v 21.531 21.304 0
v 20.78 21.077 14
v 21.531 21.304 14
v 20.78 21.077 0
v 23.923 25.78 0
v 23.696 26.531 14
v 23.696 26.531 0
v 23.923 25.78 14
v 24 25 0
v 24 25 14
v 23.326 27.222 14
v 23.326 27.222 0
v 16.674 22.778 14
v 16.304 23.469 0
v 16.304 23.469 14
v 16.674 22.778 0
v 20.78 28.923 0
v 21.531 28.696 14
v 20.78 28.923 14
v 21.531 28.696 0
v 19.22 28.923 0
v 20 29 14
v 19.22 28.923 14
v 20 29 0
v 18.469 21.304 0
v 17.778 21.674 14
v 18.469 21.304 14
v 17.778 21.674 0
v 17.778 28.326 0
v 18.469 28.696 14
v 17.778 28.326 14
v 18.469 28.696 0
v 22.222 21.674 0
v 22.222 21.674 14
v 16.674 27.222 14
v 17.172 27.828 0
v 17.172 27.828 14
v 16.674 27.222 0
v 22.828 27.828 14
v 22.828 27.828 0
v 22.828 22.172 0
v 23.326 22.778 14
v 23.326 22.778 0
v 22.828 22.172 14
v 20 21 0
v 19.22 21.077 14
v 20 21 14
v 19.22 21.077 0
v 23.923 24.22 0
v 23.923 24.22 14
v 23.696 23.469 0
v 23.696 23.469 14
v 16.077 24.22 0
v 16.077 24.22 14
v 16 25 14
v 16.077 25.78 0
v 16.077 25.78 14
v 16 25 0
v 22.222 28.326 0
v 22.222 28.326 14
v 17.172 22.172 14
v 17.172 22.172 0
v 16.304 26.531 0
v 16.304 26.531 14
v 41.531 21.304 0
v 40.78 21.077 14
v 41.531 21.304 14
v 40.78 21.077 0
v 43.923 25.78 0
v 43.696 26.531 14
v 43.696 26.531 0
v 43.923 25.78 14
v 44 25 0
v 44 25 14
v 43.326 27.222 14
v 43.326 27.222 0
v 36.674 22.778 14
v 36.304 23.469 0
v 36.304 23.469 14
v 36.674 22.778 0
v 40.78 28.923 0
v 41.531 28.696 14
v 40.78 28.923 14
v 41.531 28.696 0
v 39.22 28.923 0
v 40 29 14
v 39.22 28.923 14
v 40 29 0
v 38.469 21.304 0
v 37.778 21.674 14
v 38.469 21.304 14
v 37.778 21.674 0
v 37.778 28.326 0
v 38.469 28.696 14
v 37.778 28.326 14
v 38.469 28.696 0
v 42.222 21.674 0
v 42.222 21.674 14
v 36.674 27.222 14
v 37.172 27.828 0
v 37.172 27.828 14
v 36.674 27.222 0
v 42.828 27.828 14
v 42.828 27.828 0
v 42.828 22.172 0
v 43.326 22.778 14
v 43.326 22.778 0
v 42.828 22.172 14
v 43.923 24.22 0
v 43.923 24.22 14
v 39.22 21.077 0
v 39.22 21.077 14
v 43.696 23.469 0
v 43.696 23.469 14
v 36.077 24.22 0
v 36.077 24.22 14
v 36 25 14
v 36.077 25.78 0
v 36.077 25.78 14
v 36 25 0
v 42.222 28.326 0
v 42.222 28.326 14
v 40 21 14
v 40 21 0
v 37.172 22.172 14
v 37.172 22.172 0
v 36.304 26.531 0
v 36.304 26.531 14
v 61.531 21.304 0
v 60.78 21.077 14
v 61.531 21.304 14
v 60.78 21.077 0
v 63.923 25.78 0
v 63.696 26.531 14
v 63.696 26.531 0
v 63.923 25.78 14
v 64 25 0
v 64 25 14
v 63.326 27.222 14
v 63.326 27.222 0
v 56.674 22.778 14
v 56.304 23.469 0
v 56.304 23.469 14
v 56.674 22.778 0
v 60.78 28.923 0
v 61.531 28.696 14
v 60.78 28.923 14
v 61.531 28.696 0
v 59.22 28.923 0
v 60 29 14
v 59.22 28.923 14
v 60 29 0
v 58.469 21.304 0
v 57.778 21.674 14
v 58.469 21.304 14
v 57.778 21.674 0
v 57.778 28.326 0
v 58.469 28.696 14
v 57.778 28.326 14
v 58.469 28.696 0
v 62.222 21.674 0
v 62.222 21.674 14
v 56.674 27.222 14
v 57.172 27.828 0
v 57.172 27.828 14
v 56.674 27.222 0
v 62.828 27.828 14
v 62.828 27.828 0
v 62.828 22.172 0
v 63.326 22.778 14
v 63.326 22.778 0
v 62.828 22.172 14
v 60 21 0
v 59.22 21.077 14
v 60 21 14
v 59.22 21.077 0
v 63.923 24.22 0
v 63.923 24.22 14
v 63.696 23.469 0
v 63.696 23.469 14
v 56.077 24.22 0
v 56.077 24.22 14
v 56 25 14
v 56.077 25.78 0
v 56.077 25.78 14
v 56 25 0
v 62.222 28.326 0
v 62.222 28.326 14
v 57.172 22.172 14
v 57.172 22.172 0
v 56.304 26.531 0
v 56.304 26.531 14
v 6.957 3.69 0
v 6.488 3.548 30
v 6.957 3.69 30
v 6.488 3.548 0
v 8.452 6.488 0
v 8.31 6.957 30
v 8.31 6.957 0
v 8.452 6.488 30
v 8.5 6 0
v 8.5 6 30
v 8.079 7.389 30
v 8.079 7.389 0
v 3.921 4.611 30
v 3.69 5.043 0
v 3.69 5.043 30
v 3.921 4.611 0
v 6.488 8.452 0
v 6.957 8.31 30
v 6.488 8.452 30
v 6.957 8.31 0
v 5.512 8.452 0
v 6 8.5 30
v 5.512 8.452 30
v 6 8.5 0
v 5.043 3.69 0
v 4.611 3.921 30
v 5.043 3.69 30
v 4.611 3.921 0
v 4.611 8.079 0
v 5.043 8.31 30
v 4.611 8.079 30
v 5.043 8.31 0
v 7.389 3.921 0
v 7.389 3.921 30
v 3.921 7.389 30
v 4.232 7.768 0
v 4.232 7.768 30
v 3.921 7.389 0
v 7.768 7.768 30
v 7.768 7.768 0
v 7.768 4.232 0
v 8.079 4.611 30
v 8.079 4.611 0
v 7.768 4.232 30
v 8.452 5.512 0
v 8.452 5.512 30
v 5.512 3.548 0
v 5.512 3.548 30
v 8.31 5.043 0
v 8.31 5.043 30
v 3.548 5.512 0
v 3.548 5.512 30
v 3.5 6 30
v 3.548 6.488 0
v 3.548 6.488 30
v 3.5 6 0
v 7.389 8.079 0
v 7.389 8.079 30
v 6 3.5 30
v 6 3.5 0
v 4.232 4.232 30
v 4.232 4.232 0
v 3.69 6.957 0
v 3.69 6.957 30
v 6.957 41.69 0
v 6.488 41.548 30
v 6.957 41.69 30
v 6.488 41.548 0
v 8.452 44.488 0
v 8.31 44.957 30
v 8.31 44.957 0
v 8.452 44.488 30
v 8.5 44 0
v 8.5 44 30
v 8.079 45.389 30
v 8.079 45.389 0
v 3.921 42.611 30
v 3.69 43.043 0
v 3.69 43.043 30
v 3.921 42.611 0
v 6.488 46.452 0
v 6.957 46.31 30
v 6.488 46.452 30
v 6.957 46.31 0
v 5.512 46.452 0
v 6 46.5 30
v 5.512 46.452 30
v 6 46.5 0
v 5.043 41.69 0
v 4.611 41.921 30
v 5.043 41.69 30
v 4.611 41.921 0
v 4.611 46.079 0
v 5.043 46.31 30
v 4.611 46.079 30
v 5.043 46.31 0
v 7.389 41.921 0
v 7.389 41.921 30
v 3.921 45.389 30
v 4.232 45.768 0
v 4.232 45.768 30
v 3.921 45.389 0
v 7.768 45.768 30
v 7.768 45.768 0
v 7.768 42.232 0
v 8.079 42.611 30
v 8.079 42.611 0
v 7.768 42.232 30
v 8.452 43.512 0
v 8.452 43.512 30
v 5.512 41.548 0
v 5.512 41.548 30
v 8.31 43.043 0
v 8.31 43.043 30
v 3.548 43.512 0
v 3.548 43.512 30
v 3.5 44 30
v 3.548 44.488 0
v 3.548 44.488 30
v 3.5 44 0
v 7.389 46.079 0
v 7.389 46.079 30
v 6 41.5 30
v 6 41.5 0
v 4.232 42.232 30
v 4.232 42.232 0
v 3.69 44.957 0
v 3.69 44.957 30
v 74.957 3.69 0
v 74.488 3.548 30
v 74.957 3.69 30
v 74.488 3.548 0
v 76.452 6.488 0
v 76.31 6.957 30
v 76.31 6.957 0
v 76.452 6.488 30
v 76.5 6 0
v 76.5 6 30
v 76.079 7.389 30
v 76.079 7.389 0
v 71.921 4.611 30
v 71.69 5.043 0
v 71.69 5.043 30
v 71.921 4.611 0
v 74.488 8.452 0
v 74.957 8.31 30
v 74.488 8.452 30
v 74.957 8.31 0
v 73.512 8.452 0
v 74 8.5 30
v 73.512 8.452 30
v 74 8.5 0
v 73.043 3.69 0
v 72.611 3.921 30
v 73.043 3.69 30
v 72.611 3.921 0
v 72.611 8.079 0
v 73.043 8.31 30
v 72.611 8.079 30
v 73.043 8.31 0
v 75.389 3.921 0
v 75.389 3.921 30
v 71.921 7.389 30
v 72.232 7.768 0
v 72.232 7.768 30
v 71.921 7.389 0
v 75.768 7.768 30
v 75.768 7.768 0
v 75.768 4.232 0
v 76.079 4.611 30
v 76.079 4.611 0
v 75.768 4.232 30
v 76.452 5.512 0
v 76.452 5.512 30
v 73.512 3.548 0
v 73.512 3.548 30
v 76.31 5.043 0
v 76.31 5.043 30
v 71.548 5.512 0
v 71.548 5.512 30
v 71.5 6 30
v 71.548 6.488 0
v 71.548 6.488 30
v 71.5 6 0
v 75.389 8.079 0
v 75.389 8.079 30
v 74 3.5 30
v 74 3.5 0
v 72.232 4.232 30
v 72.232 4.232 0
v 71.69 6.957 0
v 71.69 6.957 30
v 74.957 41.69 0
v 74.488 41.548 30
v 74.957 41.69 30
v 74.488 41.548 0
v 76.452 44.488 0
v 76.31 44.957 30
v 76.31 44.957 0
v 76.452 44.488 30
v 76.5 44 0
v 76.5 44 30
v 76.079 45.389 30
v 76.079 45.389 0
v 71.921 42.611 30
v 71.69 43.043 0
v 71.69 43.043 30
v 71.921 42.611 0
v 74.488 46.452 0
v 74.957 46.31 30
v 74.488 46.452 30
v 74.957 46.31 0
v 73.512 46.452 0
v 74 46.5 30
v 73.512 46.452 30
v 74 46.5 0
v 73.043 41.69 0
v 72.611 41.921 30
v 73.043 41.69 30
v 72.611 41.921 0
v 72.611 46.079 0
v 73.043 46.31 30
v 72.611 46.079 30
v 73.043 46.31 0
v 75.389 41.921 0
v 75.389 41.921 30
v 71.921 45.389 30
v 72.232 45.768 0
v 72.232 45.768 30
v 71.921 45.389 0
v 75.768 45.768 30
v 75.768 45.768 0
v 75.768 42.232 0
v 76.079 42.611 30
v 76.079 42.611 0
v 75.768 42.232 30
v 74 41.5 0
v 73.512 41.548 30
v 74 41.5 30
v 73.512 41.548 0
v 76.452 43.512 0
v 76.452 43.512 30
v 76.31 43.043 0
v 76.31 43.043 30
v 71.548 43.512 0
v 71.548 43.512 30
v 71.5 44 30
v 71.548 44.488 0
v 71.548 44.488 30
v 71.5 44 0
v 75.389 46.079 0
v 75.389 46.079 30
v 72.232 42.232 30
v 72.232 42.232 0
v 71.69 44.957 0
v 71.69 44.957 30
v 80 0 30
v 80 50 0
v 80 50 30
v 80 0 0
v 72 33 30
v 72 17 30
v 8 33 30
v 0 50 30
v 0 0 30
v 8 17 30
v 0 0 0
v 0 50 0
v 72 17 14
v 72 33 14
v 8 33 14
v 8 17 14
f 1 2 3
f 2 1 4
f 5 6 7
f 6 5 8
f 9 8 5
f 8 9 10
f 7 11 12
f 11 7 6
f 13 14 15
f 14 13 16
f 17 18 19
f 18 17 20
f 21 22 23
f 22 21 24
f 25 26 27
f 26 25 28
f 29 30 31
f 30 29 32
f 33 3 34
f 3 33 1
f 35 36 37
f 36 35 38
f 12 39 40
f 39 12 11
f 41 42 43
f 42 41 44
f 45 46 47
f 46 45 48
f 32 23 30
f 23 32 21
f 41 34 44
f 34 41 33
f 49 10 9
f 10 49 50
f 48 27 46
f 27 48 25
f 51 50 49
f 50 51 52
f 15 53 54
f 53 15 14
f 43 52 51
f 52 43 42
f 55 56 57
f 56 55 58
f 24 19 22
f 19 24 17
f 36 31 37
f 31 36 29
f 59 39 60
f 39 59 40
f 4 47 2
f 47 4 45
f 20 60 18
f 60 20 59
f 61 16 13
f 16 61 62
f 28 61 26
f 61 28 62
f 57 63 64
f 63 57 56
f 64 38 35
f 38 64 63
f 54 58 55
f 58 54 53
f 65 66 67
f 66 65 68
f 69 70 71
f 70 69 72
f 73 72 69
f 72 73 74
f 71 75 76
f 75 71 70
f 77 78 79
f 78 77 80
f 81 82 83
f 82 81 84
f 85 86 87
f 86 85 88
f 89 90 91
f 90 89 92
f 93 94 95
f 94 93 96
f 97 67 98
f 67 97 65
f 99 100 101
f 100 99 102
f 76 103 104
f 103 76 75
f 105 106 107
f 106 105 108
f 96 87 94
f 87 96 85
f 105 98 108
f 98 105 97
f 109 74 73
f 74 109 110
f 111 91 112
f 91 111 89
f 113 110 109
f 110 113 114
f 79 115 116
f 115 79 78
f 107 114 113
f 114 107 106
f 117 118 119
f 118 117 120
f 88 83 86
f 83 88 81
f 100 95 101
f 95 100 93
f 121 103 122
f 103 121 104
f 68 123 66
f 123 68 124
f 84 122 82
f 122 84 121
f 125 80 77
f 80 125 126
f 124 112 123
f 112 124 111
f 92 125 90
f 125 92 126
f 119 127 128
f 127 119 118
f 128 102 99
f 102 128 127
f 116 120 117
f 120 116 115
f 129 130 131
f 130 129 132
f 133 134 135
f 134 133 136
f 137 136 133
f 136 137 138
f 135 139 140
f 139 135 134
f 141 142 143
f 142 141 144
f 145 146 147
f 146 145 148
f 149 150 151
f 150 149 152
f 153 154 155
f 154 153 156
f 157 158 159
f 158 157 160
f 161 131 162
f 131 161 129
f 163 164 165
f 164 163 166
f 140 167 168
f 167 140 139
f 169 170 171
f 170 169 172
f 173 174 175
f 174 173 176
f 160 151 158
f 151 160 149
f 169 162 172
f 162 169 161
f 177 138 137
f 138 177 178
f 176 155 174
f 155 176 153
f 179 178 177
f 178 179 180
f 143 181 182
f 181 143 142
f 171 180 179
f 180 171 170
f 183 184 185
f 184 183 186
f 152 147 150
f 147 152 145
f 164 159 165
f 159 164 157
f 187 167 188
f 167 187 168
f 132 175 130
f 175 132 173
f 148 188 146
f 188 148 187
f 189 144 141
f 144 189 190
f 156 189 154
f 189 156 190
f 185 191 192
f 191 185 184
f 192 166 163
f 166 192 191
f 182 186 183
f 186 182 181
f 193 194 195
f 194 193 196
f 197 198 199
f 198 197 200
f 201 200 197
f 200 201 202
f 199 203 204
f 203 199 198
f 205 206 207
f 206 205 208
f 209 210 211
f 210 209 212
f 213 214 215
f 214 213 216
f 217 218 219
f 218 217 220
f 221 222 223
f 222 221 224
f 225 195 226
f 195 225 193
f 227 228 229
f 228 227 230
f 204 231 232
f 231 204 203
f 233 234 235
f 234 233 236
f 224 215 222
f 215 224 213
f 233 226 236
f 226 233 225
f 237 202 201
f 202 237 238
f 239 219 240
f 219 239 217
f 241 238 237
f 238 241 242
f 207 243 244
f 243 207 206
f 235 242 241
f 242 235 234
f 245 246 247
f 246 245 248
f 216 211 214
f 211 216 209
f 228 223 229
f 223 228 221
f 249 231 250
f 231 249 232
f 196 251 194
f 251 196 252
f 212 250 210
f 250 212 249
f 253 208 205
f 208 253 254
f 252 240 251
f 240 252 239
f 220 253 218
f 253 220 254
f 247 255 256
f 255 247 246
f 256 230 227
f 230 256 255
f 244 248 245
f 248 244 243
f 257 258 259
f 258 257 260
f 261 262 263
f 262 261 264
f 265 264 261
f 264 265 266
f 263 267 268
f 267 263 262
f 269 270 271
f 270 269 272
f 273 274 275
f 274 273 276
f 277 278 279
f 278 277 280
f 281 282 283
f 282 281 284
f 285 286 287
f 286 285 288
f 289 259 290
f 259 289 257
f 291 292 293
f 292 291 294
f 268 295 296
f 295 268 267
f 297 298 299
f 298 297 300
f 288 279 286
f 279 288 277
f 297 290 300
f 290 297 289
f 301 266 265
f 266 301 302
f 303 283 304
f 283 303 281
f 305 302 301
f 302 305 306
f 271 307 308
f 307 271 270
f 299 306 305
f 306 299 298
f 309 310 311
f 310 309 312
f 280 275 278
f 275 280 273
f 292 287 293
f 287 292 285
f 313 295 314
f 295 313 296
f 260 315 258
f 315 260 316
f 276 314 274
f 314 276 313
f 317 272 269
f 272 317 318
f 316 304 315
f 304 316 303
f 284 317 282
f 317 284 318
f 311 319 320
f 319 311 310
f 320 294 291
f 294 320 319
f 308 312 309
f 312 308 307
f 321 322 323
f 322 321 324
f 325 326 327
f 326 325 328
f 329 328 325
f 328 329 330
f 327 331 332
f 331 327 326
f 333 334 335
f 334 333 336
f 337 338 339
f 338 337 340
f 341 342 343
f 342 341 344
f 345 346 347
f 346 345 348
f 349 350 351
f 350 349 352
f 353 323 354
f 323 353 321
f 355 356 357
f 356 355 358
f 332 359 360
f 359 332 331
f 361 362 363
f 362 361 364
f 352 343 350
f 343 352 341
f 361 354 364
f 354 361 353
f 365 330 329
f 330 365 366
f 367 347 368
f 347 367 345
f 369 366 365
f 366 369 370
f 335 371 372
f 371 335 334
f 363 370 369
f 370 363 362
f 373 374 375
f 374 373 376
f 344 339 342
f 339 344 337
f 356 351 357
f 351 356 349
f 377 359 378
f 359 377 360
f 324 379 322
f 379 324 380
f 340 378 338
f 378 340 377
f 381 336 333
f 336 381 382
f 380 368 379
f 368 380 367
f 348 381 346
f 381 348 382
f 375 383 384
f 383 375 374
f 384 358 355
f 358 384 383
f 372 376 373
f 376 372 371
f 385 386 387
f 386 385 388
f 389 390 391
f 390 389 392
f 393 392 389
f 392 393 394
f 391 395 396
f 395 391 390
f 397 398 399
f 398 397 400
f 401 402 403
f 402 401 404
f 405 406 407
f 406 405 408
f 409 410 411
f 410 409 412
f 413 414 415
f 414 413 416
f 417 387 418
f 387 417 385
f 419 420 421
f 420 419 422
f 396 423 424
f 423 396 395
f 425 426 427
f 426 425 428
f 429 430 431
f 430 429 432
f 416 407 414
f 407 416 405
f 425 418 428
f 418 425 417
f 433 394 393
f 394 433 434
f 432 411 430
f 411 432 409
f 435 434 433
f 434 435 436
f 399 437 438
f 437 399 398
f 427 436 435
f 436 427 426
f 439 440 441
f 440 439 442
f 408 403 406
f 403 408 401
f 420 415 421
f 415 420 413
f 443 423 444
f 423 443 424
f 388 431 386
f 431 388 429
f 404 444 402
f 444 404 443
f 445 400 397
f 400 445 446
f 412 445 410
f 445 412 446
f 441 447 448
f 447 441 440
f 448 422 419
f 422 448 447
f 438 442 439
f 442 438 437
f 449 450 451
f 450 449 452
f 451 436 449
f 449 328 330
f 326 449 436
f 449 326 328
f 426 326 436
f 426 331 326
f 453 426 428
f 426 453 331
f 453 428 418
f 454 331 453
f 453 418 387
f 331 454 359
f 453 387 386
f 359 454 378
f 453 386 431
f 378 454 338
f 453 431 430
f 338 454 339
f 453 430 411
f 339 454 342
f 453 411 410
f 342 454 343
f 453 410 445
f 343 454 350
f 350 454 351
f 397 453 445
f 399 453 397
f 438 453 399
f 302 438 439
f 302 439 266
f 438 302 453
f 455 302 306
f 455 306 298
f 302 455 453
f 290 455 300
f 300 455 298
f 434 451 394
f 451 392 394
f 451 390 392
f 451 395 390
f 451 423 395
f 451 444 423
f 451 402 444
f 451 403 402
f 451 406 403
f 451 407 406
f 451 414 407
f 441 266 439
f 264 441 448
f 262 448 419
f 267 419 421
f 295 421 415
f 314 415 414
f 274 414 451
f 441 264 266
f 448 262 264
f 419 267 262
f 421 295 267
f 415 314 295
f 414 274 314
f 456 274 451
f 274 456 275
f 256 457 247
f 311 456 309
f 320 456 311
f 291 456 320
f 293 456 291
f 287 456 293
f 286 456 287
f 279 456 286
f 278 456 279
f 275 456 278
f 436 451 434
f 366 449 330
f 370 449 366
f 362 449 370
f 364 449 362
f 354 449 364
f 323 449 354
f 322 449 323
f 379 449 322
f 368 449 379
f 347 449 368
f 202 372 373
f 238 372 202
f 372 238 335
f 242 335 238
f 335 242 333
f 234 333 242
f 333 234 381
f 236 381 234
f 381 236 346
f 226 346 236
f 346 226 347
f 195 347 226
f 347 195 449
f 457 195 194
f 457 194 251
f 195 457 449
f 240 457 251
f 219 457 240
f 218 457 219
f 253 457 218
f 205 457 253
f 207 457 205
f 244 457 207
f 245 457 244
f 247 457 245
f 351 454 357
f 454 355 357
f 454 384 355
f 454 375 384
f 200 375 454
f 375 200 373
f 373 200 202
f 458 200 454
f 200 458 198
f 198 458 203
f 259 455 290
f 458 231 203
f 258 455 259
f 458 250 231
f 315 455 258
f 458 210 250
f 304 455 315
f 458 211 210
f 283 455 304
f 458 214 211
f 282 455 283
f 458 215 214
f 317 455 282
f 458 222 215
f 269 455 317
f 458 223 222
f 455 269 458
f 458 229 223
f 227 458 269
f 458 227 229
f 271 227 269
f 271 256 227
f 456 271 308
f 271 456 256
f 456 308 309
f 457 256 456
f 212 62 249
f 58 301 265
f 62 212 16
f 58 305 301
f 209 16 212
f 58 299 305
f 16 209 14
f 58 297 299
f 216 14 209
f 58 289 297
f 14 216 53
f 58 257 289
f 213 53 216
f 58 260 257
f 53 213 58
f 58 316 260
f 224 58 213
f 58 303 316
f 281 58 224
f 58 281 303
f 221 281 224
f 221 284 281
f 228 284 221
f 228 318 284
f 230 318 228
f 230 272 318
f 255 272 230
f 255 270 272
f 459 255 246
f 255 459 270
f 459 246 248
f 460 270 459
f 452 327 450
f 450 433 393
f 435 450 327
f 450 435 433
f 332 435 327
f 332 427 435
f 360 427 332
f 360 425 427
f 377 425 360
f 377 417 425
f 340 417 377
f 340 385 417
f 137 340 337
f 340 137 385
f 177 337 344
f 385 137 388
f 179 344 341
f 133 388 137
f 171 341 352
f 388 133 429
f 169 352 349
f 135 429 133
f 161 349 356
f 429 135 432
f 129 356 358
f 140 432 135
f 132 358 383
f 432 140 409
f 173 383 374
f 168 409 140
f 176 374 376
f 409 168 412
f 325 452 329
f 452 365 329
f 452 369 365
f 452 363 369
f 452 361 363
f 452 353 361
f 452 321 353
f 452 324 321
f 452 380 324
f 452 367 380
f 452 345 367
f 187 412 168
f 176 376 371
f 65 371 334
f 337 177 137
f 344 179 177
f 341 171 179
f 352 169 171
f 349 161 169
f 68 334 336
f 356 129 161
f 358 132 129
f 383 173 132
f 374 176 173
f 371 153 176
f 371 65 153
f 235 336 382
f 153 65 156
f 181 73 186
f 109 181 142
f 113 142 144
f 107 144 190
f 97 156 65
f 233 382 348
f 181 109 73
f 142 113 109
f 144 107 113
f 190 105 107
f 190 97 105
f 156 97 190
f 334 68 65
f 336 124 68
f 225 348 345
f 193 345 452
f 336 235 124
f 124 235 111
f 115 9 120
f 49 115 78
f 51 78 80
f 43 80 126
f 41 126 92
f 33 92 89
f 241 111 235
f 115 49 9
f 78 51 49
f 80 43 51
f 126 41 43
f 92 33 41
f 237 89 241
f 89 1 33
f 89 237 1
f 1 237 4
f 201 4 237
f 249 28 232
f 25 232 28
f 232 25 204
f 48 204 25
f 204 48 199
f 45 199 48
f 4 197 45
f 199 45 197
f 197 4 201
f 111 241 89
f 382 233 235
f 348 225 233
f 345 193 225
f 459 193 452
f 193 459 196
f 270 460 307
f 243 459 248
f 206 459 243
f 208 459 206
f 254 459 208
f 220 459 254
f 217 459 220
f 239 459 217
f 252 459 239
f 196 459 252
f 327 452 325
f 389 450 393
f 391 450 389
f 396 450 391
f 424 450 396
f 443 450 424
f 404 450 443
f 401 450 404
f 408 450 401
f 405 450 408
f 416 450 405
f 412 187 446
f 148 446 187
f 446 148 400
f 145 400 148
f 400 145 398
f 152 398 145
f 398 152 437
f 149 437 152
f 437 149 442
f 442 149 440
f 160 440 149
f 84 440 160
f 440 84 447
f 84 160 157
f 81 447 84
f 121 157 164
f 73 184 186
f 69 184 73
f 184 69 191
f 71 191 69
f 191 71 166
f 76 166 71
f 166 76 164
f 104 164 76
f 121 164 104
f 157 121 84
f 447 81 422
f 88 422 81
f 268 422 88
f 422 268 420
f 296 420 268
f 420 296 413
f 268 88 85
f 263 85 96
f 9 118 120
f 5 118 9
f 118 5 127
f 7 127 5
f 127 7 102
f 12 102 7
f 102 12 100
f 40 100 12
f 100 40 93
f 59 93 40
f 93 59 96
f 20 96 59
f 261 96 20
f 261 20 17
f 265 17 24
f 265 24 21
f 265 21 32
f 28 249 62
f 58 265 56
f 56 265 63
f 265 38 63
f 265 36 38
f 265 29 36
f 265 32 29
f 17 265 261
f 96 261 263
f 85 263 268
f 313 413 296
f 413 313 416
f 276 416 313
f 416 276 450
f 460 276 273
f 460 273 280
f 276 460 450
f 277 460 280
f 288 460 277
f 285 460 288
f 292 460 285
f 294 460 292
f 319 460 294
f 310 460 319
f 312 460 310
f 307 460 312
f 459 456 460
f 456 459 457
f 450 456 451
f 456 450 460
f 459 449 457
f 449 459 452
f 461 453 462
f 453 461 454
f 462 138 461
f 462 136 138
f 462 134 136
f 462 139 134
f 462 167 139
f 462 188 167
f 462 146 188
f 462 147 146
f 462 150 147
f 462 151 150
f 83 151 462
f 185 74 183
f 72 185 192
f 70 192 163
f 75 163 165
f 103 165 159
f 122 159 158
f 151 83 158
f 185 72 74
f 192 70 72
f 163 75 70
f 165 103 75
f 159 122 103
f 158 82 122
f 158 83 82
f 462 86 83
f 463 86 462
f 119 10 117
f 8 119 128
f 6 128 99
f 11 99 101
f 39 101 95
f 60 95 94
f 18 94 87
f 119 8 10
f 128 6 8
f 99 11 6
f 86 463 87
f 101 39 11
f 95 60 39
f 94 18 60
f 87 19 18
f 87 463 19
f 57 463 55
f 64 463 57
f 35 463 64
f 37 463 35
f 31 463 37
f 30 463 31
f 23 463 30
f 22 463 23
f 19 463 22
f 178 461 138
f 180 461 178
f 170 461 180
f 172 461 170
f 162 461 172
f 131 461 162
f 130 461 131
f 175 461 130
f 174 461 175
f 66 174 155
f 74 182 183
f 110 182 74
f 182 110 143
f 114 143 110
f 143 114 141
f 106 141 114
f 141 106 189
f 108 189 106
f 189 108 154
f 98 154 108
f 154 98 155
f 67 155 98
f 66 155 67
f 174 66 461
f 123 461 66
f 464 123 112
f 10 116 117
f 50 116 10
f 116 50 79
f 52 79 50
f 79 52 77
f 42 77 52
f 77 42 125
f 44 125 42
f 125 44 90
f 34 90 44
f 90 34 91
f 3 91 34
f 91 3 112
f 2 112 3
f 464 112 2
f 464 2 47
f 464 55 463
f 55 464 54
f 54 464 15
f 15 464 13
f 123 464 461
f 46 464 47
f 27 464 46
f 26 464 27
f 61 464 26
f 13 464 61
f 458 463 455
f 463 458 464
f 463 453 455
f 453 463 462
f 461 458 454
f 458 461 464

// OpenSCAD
$fn = 32;

// ----------------------------------------------------------------------
// Manifold block: gallery_top manifold
// ----------------------------------------------------------------------

// --- parameters (mm) ---
block_l = 80;             // block length, X
block_w = 50;             // block width, Y
block_h = 30;             // block height, Z
port_d = 8;               // port bore diameter
port_pitch = 20;          // port pitch along X
gallery_d = 16;           // top gallery width, Y
gallery_depth = 16;       // gallery pocket depth
wall_p = 8;               // gallery end wall thickness, X
mnt_d = 5;                // mounting hole diameter
mnt_in = 6;               // mounting hole inset from the edges

n_ports = 3;  // ports in the row
port_x0 = (block_l - (n_ports - 1) * port_pitch) / 2;  // first port X

difference() {
  cube([block_l, block_w, block_h]);
  for (i = [0 : n_ports - 1])
    translate([port_x0 + i * port_pitch, block_w / 2, -1])
      cylinder(h = block_h + 2, d = port_d);
  translate([wall_p, block_w / 2 - gallery_d / 2, block_h - gallery_depth])
    cube([block_l - 2 * wall_p, gallery_d, gallery_depth + 1]);
  for (cx = [mnt_in, block_l - mnt_in])
    for (cy = [mnt_in, block_w - mnt_in])
      translate([cx, cy, -1]) cylinder(h = block_h + 2, d = mnt_d);
}
